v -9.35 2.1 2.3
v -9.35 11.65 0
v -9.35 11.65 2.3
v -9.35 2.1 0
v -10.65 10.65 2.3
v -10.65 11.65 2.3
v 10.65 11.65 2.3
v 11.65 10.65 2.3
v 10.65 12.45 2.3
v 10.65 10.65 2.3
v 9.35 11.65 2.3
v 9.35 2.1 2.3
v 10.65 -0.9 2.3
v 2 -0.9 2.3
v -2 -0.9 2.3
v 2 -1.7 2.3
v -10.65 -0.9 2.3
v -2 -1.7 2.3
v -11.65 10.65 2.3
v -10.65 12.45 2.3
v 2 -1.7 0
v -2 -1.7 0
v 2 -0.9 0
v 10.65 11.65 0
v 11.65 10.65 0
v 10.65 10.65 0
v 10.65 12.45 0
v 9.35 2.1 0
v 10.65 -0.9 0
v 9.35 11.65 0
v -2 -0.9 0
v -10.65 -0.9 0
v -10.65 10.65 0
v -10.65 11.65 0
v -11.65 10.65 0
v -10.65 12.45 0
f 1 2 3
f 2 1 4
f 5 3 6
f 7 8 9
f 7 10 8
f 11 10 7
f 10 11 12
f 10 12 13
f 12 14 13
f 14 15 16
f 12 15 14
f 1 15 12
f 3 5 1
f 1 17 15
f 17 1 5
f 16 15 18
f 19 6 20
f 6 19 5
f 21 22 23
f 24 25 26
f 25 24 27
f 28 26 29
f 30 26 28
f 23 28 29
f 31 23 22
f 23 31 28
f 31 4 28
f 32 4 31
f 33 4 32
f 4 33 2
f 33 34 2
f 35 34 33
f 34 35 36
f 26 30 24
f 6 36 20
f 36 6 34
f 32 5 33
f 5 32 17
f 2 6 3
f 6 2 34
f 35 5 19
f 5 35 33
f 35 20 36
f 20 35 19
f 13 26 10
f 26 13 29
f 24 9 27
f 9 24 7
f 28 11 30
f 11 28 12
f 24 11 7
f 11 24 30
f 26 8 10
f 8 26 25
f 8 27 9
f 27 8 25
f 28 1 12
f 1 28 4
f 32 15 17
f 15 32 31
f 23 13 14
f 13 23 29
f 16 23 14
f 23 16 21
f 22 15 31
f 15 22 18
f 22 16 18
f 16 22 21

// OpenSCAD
// ====================================================================
// Reusable Retention Clip for I2C Strain-Relief Tunnel
// Prints flat on the build plate (XY plane) for maximum layer strength
// ====================================================================

$fn = 60;

// Matching clamp dimensions
pcb_w         = 15.3;
spine_w       = pcb_w + 4.0;   // 19.3 mm (width of the clamp platform)
tunnel_th     = 1.8;          // Tunnel depth (Y)
tunnel_w      = 2.8;          // Tunnel height (Z)

// Clip-specific tolerances & sizing
fit_gap       = 0.25;         // Clearance for easy slide-in
prong_th      = tunnel_th - fit_gap * 2; // ~1.3 mm
prong_w       = tunnel_w  - fit_gap * 2; // ~2.3 mm
barb_len      = 1.0;          // How far barbs flare outward to lock
clip_span     = spine_w + 2.0;// Internal span between legs

module strain_relief_clip() {
    // 1. Center Cross-Bar (Sits over the cable)
    translate([-clip_span/2, -tunnel_th/2, 0])
        cube([clip_span, tunnel_th + 1.2, prong_w]);
    
    // Cable pressure saddle (pushes down on the wire)
    translate([-2.0, -tunnel_th/2 - 0.8, 0])
        cube([4.0, 0.8, prong_w]);

    // 2. Twin Locking Prongs
    for (side = [-1, 1]) {
        translate([side * (clip_span/2 - prong_th/2), 0, 0]) {
            // Main shaft of prong
            translate([-prong_th/2, 0, 0])
                cube([prong_th, spine_w/2 + 2.0, prong_w]);

            // Snap Barb on the end
            translate([side * (prong_th/2), spine_w/2 + 1.0, 0])
                linear_extrude(height = prong_w)
                    polygon([
                        [0, 0],
                        [side * barb_len, 0],
                        [0, 1.8]
                    ]);
        }
    }
}

strain_relief_clip();
